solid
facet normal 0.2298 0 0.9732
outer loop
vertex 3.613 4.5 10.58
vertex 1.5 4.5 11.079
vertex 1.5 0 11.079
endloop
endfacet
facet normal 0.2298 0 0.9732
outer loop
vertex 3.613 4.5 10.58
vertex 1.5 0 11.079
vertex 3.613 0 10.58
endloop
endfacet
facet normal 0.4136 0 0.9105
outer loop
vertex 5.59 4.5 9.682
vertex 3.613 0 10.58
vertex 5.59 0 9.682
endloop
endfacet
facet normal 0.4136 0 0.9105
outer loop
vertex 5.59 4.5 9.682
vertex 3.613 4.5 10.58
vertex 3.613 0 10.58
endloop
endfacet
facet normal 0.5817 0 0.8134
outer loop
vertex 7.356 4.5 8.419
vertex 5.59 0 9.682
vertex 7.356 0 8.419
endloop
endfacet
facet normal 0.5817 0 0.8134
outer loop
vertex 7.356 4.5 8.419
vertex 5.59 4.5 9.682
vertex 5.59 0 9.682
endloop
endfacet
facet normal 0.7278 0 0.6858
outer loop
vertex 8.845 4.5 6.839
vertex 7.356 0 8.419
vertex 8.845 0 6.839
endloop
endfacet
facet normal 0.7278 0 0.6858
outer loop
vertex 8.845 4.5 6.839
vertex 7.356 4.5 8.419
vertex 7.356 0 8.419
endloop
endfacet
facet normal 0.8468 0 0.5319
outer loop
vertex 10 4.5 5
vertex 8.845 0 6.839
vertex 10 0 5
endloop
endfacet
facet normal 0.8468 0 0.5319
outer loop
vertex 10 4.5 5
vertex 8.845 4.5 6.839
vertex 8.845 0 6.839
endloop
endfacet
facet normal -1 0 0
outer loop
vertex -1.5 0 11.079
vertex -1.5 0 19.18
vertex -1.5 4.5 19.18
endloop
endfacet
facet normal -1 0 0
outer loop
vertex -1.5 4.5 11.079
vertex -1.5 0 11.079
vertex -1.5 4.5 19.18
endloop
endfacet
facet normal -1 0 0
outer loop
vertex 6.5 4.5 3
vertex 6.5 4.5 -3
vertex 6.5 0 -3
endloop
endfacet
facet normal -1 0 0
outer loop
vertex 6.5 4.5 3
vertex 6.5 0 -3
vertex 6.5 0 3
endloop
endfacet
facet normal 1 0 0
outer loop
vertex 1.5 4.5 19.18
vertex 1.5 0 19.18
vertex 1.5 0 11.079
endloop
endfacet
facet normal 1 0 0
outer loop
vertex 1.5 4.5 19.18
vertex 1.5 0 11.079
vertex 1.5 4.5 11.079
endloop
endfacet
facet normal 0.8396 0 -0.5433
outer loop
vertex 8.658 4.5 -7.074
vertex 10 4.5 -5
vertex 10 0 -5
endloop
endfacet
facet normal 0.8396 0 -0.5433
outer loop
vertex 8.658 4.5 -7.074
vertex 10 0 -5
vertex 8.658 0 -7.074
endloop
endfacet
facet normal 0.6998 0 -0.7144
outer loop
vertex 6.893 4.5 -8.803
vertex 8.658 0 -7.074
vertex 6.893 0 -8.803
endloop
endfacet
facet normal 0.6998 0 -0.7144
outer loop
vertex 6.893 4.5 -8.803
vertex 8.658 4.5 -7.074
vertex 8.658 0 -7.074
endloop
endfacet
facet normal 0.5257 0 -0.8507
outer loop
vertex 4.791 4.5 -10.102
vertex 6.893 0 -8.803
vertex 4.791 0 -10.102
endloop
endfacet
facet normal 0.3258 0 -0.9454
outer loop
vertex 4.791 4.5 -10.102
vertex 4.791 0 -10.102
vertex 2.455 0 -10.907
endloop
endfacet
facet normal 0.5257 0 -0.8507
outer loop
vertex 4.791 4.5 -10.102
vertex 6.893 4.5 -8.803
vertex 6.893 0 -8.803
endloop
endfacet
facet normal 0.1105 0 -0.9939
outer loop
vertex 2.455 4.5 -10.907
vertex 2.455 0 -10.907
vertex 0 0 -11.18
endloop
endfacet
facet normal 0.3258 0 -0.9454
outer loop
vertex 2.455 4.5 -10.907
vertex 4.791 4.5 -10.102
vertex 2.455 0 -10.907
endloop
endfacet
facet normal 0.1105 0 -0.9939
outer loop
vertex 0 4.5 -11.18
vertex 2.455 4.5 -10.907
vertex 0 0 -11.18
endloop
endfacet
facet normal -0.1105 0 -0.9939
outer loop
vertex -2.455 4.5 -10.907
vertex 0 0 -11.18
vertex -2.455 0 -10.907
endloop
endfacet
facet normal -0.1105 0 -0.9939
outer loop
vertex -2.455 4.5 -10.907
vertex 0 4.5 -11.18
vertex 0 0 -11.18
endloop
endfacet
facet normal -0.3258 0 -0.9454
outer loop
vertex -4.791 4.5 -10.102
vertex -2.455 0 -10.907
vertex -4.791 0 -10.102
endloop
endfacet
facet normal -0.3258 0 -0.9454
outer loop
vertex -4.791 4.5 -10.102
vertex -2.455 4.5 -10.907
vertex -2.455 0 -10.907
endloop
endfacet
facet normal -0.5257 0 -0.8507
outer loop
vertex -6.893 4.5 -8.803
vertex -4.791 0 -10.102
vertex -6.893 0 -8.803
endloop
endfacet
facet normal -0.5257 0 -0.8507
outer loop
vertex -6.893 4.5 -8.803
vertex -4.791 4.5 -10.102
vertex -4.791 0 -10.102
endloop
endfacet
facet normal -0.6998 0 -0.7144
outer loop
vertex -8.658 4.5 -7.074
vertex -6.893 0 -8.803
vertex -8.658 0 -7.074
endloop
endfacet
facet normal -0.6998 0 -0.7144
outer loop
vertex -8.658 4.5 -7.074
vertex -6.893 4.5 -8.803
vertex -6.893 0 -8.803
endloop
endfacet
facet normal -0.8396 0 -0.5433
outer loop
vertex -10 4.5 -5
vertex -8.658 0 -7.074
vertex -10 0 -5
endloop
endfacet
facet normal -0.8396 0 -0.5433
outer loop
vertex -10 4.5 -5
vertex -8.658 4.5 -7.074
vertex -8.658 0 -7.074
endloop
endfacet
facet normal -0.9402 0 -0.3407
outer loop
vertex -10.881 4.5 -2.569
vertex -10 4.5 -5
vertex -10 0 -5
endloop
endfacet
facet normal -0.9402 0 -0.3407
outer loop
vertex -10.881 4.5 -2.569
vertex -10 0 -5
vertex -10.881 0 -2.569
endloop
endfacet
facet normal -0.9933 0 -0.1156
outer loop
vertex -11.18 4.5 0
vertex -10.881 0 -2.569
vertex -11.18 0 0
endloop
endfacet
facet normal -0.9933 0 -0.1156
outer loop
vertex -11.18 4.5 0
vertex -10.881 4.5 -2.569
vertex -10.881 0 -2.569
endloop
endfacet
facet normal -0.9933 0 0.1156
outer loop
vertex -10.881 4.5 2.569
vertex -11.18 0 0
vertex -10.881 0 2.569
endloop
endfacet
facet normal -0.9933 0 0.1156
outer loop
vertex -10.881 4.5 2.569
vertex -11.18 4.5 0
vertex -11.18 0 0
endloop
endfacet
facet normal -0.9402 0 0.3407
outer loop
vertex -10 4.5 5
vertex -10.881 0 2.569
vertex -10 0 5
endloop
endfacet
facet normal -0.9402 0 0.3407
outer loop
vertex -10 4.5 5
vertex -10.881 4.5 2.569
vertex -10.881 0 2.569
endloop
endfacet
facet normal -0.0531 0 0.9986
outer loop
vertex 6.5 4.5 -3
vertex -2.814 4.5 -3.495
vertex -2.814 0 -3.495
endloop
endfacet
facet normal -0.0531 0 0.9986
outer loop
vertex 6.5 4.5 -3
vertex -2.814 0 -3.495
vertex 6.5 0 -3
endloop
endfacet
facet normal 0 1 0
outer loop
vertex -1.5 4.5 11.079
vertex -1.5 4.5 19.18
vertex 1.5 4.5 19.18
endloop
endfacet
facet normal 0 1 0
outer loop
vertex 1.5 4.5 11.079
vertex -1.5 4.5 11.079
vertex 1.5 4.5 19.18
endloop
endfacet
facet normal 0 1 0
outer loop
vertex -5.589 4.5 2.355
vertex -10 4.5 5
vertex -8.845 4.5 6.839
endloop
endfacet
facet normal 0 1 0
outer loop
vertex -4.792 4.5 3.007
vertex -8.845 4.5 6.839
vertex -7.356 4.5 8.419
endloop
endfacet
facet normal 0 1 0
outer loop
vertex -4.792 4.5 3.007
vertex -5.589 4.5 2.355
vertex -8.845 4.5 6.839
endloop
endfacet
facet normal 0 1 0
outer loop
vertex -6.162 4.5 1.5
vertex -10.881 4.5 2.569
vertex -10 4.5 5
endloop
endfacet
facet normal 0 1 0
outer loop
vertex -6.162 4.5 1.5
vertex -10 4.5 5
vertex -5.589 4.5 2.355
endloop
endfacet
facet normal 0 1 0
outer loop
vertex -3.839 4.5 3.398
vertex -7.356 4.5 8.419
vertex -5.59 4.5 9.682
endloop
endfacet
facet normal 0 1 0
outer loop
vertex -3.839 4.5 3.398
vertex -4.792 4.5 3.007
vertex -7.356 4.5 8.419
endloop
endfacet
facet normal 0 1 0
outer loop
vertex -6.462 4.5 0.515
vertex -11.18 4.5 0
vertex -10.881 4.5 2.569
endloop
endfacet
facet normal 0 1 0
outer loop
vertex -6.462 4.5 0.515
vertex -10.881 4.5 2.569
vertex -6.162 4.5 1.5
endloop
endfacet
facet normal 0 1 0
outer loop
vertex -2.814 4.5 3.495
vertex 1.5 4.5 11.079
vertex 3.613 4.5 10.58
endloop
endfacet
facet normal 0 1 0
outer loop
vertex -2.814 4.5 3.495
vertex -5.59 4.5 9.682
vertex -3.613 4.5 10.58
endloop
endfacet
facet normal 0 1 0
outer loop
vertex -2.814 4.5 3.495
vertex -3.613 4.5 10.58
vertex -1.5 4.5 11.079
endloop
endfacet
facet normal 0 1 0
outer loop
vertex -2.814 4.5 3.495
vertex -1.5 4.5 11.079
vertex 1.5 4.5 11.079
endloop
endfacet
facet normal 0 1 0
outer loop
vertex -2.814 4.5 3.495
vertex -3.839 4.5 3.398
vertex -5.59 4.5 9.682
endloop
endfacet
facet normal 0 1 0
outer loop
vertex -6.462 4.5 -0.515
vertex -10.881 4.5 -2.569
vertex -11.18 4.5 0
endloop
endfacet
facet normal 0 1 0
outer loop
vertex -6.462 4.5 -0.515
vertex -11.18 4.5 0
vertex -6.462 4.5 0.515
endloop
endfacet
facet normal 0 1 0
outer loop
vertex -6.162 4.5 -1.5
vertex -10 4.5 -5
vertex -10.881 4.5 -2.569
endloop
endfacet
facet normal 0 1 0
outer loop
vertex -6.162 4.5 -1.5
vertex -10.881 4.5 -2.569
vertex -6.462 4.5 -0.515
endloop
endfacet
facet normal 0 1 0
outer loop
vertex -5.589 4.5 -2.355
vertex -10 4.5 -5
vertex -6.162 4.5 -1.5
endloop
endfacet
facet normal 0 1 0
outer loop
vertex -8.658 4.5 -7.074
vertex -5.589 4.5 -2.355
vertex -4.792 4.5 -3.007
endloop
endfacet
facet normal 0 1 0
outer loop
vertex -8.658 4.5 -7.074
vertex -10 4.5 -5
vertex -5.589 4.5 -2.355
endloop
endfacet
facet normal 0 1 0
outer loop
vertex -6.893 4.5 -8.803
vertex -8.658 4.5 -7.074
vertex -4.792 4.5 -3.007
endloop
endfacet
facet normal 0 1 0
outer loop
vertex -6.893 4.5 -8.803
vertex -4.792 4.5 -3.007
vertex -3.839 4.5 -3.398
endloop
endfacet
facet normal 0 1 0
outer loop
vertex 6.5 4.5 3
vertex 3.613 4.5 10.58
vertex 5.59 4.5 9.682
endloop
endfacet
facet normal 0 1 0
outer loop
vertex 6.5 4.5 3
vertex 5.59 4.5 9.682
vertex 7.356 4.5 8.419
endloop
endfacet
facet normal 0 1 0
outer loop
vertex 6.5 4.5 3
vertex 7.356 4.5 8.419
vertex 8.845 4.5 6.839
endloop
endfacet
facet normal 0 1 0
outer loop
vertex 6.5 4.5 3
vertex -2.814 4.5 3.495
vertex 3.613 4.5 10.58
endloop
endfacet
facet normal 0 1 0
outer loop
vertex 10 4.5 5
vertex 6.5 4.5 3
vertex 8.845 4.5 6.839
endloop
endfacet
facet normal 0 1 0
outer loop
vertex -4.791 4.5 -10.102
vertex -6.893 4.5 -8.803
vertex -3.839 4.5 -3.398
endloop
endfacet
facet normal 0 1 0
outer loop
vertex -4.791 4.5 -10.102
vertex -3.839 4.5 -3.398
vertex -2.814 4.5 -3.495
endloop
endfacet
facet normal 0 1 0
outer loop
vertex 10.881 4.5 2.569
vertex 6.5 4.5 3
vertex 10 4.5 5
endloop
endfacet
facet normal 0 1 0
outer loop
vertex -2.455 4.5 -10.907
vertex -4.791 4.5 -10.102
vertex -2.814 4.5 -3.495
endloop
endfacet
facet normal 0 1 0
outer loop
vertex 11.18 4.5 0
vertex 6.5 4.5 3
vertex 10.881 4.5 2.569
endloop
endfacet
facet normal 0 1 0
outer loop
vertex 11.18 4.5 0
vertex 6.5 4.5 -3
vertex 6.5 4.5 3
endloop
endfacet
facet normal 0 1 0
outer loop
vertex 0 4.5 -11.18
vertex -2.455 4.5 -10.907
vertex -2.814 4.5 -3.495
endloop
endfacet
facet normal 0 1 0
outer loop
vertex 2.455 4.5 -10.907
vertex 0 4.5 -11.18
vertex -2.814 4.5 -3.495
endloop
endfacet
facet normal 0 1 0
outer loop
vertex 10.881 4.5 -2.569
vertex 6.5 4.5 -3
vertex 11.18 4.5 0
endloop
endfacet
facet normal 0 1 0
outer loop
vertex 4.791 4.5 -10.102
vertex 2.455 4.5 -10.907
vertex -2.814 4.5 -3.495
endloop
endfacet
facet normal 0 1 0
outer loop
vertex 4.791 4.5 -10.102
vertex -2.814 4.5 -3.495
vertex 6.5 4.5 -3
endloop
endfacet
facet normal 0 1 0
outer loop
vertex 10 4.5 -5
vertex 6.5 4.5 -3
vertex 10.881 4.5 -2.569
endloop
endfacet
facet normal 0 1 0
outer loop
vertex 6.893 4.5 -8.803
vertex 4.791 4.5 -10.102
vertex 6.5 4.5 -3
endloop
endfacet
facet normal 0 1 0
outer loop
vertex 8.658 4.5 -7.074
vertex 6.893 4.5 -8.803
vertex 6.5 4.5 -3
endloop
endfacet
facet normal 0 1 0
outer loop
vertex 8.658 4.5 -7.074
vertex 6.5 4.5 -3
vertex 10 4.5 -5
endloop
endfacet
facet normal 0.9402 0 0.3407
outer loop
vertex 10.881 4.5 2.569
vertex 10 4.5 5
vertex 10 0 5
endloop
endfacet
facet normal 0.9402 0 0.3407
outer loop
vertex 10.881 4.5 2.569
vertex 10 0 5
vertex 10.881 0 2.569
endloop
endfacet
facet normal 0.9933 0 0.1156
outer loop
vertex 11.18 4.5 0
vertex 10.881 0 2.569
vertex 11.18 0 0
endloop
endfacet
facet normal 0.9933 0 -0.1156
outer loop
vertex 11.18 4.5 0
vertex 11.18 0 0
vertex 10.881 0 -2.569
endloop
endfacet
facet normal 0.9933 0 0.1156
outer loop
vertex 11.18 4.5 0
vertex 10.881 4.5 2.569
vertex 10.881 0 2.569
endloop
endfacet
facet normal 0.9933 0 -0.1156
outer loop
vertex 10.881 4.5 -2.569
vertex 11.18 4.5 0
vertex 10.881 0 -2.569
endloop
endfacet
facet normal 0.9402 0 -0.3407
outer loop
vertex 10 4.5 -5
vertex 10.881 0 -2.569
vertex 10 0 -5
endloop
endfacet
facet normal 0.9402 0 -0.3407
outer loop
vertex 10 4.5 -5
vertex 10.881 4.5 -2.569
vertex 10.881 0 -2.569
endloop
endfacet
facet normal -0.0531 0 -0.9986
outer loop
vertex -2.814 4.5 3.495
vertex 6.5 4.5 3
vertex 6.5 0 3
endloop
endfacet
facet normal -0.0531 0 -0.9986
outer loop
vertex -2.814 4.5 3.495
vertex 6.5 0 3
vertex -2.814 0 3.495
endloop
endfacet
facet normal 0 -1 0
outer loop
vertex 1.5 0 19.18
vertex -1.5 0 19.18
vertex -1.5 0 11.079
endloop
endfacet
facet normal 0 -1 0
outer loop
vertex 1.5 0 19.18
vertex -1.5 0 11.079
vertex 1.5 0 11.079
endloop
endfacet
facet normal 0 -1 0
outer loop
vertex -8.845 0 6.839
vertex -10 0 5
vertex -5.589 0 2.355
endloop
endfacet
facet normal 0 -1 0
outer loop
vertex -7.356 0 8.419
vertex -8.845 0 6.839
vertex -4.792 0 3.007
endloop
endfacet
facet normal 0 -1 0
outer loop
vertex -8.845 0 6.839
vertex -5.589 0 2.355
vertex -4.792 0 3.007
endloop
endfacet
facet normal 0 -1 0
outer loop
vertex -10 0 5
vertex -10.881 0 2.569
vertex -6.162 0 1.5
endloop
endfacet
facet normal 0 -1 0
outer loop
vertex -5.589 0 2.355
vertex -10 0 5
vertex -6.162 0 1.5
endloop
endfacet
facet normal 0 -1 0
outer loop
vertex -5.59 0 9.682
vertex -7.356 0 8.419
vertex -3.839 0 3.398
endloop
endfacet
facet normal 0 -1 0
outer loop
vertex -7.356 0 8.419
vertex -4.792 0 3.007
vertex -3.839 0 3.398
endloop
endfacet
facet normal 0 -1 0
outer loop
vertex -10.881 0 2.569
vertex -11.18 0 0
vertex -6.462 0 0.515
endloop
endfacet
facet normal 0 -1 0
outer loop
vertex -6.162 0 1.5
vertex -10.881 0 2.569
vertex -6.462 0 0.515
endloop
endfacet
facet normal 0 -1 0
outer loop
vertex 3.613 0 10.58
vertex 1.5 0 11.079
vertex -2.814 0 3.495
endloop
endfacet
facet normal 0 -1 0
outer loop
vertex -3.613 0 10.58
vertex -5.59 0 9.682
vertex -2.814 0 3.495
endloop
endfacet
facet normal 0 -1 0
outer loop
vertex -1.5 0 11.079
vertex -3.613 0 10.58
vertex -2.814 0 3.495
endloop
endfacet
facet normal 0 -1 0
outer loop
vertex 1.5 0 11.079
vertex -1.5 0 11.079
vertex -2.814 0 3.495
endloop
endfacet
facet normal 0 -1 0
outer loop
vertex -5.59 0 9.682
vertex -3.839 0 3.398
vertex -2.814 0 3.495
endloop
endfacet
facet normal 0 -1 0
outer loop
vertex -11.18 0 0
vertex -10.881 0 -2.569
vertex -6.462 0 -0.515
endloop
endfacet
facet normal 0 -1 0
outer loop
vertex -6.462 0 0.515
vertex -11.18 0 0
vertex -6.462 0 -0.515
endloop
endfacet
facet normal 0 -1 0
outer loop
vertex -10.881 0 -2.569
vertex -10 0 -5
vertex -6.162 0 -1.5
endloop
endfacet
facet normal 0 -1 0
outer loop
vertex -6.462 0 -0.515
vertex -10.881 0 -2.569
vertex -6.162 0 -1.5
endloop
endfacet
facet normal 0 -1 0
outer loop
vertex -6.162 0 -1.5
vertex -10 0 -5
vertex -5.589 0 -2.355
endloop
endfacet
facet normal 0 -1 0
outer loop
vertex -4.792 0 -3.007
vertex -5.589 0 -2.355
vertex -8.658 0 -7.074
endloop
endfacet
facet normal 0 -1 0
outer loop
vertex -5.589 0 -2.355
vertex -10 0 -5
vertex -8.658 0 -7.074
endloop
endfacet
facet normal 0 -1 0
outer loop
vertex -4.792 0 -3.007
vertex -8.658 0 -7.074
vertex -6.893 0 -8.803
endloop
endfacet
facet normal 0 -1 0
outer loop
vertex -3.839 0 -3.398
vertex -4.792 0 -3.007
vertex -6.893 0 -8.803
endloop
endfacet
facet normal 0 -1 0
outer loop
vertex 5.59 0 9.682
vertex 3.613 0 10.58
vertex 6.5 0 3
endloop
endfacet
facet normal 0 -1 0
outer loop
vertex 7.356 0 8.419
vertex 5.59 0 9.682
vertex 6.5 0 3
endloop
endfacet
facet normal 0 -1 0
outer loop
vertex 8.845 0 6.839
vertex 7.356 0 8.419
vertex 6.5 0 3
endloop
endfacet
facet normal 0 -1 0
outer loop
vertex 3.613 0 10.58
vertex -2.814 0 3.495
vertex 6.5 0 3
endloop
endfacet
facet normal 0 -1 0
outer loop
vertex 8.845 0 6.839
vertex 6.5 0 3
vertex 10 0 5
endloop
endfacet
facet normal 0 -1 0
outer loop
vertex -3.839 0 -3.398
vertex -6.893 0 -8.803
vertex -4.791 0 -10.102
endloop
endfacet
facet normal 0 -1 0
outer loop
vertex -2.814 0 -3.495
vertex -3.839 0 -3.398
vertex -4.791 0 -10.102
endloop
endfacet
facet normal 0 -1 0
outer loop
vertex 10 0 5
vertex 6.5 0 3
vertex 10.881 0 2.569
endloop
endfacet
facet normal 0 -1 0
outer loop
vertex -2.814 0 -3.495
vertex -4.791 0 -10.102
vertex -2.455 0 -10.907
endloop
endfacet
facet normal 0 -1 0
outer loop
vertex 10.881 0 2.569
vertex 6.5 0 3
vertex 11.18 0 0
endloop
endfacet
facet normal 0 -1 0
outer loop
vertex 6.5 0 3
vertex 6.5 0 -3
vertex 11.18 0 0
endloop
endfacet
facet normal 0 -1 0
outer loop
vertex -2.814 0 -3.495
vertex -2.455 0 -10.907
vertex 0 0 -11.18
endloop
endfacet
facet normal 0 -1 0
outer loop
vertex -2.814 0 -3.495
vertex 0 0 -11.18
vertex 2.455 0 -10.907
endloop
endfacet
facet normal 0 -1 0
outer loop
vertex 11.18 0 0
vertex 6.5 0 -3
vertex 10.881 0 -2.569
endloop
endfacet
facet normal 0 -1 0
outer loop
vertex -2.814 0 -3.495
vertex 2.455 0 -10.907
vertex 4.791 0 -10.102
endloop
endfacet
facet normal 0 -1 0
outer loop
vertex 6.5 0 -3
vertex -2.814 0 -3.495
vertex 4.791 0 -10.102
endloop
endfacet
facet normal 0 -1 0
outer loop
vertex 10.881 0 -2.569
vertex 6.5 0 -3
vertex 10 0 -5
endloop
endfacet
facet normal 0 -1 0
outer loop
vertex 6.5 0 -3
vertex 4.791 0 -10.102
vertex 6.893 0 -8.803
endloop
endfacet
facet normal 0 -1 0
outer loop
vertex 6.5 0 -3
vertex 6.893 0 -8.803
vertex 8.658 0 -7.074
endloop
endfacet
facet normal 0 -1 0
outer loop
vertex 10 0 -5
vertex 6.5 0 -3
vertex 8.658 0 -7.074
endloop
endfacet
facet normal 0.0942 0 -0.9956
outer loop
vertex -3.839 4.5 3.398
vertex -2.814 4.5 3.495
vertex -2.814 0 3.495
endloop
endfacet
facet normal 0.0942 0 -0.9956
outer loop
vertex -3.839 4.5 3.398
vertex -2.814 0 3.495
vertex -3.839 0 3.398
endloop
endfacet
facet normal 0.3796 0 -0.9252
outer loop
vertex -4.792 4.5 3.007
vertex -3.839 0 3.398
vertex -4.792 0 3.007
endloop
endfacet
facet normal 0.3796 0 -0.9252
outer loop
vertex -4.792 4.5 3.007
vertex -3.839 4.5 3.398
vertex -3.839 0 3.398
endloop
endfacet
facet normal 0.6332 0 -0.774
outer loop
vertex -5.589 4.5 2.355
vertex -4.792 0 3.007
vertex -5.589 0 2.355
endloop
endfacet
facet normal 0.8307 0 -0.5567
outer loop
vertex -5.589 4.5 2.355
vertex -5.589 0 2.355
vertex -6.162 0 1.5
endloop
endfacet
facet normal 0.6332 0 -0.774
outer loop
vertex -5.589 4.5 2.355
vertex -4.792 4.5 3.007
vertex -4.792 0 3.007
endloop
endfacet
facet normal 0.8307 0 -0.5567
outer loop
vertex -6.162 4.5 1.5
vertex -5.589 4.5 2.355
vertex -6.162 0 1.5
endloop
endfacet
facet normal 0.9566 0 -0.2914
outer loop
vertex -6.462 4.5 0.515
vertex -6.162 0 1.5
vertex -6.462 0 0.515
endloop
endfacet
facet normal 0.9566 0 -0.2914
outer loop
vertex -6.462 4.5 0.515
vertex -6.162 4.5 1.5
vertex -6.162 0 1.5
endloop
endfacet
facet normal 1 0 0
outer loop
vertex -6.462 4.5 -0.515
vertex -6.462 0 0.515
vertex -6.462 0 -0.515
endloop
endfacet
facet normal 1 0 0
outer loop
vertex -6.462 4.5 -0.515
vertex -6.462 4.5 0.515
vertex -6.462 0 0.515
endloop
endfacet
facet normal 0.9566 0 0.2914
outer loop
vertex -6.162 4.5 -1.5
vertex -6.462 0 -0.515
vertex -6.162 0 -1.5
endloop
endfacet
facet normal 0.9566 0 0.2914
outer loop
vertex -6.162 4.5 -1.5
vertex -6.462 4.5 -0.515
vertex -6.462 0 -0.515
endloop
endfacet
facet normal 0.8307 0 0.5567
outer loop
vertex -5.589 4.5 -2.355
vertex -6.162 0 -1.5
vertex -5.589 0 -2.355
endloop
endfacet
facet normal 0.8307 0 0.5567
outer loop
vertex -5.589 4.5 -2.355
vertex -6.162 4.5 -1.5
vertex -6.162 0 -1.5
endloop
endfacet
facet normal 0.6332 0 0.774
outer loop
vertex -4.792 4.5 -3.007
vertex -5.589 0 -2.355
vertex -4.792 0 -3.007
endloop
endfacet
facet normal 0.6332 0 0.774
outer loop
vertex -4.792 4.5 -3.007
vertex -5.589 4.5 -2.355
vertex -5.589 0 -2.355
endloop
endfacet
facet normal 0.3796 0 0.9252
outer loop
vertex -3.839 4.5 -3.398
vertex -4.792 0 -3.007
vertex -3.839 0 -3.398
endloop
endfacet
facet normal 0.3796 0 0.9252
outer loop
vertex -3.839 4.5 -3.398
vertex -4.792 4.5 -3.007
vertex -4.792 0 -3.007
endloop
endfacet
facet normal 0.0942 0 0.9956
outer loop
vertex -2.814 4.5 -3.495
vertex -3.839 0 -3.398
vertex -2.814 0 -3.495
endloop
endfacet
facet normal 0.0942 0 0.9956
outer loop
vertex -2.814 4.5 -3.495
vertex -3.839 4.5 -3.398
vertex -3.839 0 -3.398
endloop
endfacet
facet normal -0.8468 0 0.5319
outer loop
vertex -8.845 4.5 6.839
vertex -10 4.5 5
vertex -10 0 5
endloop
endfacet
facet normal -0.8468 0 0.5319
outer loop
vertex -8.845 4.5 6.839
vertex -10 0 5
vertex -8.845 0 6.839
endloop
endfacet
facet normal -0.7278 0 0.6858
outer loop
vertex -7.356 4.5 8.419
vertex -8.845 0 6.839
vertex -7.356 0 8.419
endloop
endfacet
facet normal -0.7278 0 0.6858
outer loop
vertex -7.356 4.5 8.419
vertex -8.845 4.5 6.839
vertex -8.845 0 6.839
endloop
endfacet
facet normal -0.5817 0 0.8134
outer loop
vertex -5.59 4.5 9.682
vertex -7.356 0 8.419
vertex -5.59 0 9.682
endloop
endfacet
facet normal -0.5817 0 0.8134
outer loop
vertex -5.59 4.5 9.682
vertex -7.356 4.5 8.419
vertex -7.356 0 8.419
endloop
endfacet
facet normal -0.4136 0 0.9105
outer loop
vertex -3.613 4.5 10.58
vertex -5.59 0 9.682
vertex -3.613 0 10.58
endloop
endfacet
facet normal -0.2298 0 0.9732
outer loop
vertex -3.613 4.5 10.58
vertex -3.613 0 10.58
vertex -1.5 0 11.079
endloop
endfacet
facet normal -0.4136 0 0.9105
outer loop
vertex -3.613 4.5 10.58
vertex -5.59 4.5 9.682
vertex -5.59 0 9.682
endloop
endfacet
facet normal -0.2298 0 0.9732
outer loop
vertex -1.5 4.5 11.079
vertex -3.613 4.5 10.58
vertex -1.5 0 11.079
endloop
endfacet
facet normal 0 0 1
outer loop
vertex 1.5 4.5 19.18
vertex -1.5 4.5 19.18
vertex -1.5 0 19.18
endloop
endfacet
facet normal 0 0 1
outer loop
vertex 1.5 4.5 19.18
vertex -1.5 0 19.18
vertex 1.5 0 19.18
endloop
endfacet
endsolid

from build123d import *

# Parameters (mm, degrees)
SKETCH_1_W          = 20
SKETCH_1_H          = 10
EXTRUDE_1_DEPTH     = 4.5
CUT_EXTRUDE_1_DEPTH = 4.5
EXTRUDE_2_DEPTH     = 4.5
SKETCH_5_W          = 3
SKETCH_5_H          = 3
CUT_EXTRUDE_2_DEPTH = 4.5
SKETCH_6_W          = 3
SKETCH_6_H          = 4.5
EXTRUDE_3_DEPTH     = 11


with BuildPart() as part:
    # 草图1 → 凸台-拉伸1 (new body)
    with BuildSketch(Plane(origin=(0, 0, 0), x_dir=(1, 0, 0), z_dir=(0, 1, 0))):
        Rectangle(SKETCH_1_W, SKETCH_1_H)
    extrude(amount=EXTRUDE_1_DEPTH)

    # 草图2 → 切除-拉伸1 (cut)
    with BuildSketch(Plane(origin=(0, 4.5, 0), x_dir=(1, 0, 0), z_dir=(0, 1, 0))):
        with BuildLine():
            Line((-2.814231537, 3.495066534), (6.5, 3))
            Line((6.5, 3), (6.5, -3))
            Line((6.5, -3), (-2.814231537, -3.495066534))
            ThreePointArc((-2.814231537, -3.495066534), (-6.5, 0), (-2.814231537, 3.495066534))
        make_face()
    extrude(amount=-CUT_EXTRUDE_1_DEPTH, mode=Mode.SUBTRACT)

    # 草图3 → 凸台-拉伸2 (add)
    with BuildSketch(Plane(origin=(0, 4.5, 0), x_dir=(1, 0, 0), z_dir=(0, 1, 0))):
        with BuildLine():
            ThreePointArc((10, 5), (0, 11.180339887), (-10, 5))
            Line((-10, 5), (10, 5))
        make_face()
        with BuildLine():
            Line((-10, -5), (-10, 5))
            ThreePointArc((-10, 5), (-11.180339887, 0), (-10, -5))
        make_face()
        with BuildLine():
            Line((10, -5), (-10, -5))
            ThreePointArc((-10, -5), (0, -11.180339887), (10, -5))
        make_face()
        with BuildLine():
            ThreePointArc((11.180339887, 0), (10.881254497, 2.568715742), (10, 5))
            Line((10, 5), (10, -5))
            ThreePointArc((10, -5), (10.881254497, -2.568715742), (11.180339887, 0))
        make_face()
    extrude(amount=-EXTRUDE_2_DEPTH)

    # 草图5 → 切除-拉伸2 (cut)
    with BuildSketch(Plane(origin=(0, 4.5, 0), x_dir=(1, 0, 0), z_dir=(0, 1, 0))):
        with Locations((0, -9.680339887)):
            Rectangle(SKETCH_5_W, SKETCH_5_H)
    extrude(amount=-CUT_EXTRUDE_2_DEPTH, mode=Mode.SUBTRACT)

    # 草图6 → 凸台-拉伸3 (add)
    with BuildSketch(Plane.XY.offset(8.180339887)):
        with Locations((0, 2.25)):
            Rectangle(SKETCH_6_W, SKETCH_6_H)
    extrude(amount=EXTRUDE_3_DEPTH)


solid = part.part
